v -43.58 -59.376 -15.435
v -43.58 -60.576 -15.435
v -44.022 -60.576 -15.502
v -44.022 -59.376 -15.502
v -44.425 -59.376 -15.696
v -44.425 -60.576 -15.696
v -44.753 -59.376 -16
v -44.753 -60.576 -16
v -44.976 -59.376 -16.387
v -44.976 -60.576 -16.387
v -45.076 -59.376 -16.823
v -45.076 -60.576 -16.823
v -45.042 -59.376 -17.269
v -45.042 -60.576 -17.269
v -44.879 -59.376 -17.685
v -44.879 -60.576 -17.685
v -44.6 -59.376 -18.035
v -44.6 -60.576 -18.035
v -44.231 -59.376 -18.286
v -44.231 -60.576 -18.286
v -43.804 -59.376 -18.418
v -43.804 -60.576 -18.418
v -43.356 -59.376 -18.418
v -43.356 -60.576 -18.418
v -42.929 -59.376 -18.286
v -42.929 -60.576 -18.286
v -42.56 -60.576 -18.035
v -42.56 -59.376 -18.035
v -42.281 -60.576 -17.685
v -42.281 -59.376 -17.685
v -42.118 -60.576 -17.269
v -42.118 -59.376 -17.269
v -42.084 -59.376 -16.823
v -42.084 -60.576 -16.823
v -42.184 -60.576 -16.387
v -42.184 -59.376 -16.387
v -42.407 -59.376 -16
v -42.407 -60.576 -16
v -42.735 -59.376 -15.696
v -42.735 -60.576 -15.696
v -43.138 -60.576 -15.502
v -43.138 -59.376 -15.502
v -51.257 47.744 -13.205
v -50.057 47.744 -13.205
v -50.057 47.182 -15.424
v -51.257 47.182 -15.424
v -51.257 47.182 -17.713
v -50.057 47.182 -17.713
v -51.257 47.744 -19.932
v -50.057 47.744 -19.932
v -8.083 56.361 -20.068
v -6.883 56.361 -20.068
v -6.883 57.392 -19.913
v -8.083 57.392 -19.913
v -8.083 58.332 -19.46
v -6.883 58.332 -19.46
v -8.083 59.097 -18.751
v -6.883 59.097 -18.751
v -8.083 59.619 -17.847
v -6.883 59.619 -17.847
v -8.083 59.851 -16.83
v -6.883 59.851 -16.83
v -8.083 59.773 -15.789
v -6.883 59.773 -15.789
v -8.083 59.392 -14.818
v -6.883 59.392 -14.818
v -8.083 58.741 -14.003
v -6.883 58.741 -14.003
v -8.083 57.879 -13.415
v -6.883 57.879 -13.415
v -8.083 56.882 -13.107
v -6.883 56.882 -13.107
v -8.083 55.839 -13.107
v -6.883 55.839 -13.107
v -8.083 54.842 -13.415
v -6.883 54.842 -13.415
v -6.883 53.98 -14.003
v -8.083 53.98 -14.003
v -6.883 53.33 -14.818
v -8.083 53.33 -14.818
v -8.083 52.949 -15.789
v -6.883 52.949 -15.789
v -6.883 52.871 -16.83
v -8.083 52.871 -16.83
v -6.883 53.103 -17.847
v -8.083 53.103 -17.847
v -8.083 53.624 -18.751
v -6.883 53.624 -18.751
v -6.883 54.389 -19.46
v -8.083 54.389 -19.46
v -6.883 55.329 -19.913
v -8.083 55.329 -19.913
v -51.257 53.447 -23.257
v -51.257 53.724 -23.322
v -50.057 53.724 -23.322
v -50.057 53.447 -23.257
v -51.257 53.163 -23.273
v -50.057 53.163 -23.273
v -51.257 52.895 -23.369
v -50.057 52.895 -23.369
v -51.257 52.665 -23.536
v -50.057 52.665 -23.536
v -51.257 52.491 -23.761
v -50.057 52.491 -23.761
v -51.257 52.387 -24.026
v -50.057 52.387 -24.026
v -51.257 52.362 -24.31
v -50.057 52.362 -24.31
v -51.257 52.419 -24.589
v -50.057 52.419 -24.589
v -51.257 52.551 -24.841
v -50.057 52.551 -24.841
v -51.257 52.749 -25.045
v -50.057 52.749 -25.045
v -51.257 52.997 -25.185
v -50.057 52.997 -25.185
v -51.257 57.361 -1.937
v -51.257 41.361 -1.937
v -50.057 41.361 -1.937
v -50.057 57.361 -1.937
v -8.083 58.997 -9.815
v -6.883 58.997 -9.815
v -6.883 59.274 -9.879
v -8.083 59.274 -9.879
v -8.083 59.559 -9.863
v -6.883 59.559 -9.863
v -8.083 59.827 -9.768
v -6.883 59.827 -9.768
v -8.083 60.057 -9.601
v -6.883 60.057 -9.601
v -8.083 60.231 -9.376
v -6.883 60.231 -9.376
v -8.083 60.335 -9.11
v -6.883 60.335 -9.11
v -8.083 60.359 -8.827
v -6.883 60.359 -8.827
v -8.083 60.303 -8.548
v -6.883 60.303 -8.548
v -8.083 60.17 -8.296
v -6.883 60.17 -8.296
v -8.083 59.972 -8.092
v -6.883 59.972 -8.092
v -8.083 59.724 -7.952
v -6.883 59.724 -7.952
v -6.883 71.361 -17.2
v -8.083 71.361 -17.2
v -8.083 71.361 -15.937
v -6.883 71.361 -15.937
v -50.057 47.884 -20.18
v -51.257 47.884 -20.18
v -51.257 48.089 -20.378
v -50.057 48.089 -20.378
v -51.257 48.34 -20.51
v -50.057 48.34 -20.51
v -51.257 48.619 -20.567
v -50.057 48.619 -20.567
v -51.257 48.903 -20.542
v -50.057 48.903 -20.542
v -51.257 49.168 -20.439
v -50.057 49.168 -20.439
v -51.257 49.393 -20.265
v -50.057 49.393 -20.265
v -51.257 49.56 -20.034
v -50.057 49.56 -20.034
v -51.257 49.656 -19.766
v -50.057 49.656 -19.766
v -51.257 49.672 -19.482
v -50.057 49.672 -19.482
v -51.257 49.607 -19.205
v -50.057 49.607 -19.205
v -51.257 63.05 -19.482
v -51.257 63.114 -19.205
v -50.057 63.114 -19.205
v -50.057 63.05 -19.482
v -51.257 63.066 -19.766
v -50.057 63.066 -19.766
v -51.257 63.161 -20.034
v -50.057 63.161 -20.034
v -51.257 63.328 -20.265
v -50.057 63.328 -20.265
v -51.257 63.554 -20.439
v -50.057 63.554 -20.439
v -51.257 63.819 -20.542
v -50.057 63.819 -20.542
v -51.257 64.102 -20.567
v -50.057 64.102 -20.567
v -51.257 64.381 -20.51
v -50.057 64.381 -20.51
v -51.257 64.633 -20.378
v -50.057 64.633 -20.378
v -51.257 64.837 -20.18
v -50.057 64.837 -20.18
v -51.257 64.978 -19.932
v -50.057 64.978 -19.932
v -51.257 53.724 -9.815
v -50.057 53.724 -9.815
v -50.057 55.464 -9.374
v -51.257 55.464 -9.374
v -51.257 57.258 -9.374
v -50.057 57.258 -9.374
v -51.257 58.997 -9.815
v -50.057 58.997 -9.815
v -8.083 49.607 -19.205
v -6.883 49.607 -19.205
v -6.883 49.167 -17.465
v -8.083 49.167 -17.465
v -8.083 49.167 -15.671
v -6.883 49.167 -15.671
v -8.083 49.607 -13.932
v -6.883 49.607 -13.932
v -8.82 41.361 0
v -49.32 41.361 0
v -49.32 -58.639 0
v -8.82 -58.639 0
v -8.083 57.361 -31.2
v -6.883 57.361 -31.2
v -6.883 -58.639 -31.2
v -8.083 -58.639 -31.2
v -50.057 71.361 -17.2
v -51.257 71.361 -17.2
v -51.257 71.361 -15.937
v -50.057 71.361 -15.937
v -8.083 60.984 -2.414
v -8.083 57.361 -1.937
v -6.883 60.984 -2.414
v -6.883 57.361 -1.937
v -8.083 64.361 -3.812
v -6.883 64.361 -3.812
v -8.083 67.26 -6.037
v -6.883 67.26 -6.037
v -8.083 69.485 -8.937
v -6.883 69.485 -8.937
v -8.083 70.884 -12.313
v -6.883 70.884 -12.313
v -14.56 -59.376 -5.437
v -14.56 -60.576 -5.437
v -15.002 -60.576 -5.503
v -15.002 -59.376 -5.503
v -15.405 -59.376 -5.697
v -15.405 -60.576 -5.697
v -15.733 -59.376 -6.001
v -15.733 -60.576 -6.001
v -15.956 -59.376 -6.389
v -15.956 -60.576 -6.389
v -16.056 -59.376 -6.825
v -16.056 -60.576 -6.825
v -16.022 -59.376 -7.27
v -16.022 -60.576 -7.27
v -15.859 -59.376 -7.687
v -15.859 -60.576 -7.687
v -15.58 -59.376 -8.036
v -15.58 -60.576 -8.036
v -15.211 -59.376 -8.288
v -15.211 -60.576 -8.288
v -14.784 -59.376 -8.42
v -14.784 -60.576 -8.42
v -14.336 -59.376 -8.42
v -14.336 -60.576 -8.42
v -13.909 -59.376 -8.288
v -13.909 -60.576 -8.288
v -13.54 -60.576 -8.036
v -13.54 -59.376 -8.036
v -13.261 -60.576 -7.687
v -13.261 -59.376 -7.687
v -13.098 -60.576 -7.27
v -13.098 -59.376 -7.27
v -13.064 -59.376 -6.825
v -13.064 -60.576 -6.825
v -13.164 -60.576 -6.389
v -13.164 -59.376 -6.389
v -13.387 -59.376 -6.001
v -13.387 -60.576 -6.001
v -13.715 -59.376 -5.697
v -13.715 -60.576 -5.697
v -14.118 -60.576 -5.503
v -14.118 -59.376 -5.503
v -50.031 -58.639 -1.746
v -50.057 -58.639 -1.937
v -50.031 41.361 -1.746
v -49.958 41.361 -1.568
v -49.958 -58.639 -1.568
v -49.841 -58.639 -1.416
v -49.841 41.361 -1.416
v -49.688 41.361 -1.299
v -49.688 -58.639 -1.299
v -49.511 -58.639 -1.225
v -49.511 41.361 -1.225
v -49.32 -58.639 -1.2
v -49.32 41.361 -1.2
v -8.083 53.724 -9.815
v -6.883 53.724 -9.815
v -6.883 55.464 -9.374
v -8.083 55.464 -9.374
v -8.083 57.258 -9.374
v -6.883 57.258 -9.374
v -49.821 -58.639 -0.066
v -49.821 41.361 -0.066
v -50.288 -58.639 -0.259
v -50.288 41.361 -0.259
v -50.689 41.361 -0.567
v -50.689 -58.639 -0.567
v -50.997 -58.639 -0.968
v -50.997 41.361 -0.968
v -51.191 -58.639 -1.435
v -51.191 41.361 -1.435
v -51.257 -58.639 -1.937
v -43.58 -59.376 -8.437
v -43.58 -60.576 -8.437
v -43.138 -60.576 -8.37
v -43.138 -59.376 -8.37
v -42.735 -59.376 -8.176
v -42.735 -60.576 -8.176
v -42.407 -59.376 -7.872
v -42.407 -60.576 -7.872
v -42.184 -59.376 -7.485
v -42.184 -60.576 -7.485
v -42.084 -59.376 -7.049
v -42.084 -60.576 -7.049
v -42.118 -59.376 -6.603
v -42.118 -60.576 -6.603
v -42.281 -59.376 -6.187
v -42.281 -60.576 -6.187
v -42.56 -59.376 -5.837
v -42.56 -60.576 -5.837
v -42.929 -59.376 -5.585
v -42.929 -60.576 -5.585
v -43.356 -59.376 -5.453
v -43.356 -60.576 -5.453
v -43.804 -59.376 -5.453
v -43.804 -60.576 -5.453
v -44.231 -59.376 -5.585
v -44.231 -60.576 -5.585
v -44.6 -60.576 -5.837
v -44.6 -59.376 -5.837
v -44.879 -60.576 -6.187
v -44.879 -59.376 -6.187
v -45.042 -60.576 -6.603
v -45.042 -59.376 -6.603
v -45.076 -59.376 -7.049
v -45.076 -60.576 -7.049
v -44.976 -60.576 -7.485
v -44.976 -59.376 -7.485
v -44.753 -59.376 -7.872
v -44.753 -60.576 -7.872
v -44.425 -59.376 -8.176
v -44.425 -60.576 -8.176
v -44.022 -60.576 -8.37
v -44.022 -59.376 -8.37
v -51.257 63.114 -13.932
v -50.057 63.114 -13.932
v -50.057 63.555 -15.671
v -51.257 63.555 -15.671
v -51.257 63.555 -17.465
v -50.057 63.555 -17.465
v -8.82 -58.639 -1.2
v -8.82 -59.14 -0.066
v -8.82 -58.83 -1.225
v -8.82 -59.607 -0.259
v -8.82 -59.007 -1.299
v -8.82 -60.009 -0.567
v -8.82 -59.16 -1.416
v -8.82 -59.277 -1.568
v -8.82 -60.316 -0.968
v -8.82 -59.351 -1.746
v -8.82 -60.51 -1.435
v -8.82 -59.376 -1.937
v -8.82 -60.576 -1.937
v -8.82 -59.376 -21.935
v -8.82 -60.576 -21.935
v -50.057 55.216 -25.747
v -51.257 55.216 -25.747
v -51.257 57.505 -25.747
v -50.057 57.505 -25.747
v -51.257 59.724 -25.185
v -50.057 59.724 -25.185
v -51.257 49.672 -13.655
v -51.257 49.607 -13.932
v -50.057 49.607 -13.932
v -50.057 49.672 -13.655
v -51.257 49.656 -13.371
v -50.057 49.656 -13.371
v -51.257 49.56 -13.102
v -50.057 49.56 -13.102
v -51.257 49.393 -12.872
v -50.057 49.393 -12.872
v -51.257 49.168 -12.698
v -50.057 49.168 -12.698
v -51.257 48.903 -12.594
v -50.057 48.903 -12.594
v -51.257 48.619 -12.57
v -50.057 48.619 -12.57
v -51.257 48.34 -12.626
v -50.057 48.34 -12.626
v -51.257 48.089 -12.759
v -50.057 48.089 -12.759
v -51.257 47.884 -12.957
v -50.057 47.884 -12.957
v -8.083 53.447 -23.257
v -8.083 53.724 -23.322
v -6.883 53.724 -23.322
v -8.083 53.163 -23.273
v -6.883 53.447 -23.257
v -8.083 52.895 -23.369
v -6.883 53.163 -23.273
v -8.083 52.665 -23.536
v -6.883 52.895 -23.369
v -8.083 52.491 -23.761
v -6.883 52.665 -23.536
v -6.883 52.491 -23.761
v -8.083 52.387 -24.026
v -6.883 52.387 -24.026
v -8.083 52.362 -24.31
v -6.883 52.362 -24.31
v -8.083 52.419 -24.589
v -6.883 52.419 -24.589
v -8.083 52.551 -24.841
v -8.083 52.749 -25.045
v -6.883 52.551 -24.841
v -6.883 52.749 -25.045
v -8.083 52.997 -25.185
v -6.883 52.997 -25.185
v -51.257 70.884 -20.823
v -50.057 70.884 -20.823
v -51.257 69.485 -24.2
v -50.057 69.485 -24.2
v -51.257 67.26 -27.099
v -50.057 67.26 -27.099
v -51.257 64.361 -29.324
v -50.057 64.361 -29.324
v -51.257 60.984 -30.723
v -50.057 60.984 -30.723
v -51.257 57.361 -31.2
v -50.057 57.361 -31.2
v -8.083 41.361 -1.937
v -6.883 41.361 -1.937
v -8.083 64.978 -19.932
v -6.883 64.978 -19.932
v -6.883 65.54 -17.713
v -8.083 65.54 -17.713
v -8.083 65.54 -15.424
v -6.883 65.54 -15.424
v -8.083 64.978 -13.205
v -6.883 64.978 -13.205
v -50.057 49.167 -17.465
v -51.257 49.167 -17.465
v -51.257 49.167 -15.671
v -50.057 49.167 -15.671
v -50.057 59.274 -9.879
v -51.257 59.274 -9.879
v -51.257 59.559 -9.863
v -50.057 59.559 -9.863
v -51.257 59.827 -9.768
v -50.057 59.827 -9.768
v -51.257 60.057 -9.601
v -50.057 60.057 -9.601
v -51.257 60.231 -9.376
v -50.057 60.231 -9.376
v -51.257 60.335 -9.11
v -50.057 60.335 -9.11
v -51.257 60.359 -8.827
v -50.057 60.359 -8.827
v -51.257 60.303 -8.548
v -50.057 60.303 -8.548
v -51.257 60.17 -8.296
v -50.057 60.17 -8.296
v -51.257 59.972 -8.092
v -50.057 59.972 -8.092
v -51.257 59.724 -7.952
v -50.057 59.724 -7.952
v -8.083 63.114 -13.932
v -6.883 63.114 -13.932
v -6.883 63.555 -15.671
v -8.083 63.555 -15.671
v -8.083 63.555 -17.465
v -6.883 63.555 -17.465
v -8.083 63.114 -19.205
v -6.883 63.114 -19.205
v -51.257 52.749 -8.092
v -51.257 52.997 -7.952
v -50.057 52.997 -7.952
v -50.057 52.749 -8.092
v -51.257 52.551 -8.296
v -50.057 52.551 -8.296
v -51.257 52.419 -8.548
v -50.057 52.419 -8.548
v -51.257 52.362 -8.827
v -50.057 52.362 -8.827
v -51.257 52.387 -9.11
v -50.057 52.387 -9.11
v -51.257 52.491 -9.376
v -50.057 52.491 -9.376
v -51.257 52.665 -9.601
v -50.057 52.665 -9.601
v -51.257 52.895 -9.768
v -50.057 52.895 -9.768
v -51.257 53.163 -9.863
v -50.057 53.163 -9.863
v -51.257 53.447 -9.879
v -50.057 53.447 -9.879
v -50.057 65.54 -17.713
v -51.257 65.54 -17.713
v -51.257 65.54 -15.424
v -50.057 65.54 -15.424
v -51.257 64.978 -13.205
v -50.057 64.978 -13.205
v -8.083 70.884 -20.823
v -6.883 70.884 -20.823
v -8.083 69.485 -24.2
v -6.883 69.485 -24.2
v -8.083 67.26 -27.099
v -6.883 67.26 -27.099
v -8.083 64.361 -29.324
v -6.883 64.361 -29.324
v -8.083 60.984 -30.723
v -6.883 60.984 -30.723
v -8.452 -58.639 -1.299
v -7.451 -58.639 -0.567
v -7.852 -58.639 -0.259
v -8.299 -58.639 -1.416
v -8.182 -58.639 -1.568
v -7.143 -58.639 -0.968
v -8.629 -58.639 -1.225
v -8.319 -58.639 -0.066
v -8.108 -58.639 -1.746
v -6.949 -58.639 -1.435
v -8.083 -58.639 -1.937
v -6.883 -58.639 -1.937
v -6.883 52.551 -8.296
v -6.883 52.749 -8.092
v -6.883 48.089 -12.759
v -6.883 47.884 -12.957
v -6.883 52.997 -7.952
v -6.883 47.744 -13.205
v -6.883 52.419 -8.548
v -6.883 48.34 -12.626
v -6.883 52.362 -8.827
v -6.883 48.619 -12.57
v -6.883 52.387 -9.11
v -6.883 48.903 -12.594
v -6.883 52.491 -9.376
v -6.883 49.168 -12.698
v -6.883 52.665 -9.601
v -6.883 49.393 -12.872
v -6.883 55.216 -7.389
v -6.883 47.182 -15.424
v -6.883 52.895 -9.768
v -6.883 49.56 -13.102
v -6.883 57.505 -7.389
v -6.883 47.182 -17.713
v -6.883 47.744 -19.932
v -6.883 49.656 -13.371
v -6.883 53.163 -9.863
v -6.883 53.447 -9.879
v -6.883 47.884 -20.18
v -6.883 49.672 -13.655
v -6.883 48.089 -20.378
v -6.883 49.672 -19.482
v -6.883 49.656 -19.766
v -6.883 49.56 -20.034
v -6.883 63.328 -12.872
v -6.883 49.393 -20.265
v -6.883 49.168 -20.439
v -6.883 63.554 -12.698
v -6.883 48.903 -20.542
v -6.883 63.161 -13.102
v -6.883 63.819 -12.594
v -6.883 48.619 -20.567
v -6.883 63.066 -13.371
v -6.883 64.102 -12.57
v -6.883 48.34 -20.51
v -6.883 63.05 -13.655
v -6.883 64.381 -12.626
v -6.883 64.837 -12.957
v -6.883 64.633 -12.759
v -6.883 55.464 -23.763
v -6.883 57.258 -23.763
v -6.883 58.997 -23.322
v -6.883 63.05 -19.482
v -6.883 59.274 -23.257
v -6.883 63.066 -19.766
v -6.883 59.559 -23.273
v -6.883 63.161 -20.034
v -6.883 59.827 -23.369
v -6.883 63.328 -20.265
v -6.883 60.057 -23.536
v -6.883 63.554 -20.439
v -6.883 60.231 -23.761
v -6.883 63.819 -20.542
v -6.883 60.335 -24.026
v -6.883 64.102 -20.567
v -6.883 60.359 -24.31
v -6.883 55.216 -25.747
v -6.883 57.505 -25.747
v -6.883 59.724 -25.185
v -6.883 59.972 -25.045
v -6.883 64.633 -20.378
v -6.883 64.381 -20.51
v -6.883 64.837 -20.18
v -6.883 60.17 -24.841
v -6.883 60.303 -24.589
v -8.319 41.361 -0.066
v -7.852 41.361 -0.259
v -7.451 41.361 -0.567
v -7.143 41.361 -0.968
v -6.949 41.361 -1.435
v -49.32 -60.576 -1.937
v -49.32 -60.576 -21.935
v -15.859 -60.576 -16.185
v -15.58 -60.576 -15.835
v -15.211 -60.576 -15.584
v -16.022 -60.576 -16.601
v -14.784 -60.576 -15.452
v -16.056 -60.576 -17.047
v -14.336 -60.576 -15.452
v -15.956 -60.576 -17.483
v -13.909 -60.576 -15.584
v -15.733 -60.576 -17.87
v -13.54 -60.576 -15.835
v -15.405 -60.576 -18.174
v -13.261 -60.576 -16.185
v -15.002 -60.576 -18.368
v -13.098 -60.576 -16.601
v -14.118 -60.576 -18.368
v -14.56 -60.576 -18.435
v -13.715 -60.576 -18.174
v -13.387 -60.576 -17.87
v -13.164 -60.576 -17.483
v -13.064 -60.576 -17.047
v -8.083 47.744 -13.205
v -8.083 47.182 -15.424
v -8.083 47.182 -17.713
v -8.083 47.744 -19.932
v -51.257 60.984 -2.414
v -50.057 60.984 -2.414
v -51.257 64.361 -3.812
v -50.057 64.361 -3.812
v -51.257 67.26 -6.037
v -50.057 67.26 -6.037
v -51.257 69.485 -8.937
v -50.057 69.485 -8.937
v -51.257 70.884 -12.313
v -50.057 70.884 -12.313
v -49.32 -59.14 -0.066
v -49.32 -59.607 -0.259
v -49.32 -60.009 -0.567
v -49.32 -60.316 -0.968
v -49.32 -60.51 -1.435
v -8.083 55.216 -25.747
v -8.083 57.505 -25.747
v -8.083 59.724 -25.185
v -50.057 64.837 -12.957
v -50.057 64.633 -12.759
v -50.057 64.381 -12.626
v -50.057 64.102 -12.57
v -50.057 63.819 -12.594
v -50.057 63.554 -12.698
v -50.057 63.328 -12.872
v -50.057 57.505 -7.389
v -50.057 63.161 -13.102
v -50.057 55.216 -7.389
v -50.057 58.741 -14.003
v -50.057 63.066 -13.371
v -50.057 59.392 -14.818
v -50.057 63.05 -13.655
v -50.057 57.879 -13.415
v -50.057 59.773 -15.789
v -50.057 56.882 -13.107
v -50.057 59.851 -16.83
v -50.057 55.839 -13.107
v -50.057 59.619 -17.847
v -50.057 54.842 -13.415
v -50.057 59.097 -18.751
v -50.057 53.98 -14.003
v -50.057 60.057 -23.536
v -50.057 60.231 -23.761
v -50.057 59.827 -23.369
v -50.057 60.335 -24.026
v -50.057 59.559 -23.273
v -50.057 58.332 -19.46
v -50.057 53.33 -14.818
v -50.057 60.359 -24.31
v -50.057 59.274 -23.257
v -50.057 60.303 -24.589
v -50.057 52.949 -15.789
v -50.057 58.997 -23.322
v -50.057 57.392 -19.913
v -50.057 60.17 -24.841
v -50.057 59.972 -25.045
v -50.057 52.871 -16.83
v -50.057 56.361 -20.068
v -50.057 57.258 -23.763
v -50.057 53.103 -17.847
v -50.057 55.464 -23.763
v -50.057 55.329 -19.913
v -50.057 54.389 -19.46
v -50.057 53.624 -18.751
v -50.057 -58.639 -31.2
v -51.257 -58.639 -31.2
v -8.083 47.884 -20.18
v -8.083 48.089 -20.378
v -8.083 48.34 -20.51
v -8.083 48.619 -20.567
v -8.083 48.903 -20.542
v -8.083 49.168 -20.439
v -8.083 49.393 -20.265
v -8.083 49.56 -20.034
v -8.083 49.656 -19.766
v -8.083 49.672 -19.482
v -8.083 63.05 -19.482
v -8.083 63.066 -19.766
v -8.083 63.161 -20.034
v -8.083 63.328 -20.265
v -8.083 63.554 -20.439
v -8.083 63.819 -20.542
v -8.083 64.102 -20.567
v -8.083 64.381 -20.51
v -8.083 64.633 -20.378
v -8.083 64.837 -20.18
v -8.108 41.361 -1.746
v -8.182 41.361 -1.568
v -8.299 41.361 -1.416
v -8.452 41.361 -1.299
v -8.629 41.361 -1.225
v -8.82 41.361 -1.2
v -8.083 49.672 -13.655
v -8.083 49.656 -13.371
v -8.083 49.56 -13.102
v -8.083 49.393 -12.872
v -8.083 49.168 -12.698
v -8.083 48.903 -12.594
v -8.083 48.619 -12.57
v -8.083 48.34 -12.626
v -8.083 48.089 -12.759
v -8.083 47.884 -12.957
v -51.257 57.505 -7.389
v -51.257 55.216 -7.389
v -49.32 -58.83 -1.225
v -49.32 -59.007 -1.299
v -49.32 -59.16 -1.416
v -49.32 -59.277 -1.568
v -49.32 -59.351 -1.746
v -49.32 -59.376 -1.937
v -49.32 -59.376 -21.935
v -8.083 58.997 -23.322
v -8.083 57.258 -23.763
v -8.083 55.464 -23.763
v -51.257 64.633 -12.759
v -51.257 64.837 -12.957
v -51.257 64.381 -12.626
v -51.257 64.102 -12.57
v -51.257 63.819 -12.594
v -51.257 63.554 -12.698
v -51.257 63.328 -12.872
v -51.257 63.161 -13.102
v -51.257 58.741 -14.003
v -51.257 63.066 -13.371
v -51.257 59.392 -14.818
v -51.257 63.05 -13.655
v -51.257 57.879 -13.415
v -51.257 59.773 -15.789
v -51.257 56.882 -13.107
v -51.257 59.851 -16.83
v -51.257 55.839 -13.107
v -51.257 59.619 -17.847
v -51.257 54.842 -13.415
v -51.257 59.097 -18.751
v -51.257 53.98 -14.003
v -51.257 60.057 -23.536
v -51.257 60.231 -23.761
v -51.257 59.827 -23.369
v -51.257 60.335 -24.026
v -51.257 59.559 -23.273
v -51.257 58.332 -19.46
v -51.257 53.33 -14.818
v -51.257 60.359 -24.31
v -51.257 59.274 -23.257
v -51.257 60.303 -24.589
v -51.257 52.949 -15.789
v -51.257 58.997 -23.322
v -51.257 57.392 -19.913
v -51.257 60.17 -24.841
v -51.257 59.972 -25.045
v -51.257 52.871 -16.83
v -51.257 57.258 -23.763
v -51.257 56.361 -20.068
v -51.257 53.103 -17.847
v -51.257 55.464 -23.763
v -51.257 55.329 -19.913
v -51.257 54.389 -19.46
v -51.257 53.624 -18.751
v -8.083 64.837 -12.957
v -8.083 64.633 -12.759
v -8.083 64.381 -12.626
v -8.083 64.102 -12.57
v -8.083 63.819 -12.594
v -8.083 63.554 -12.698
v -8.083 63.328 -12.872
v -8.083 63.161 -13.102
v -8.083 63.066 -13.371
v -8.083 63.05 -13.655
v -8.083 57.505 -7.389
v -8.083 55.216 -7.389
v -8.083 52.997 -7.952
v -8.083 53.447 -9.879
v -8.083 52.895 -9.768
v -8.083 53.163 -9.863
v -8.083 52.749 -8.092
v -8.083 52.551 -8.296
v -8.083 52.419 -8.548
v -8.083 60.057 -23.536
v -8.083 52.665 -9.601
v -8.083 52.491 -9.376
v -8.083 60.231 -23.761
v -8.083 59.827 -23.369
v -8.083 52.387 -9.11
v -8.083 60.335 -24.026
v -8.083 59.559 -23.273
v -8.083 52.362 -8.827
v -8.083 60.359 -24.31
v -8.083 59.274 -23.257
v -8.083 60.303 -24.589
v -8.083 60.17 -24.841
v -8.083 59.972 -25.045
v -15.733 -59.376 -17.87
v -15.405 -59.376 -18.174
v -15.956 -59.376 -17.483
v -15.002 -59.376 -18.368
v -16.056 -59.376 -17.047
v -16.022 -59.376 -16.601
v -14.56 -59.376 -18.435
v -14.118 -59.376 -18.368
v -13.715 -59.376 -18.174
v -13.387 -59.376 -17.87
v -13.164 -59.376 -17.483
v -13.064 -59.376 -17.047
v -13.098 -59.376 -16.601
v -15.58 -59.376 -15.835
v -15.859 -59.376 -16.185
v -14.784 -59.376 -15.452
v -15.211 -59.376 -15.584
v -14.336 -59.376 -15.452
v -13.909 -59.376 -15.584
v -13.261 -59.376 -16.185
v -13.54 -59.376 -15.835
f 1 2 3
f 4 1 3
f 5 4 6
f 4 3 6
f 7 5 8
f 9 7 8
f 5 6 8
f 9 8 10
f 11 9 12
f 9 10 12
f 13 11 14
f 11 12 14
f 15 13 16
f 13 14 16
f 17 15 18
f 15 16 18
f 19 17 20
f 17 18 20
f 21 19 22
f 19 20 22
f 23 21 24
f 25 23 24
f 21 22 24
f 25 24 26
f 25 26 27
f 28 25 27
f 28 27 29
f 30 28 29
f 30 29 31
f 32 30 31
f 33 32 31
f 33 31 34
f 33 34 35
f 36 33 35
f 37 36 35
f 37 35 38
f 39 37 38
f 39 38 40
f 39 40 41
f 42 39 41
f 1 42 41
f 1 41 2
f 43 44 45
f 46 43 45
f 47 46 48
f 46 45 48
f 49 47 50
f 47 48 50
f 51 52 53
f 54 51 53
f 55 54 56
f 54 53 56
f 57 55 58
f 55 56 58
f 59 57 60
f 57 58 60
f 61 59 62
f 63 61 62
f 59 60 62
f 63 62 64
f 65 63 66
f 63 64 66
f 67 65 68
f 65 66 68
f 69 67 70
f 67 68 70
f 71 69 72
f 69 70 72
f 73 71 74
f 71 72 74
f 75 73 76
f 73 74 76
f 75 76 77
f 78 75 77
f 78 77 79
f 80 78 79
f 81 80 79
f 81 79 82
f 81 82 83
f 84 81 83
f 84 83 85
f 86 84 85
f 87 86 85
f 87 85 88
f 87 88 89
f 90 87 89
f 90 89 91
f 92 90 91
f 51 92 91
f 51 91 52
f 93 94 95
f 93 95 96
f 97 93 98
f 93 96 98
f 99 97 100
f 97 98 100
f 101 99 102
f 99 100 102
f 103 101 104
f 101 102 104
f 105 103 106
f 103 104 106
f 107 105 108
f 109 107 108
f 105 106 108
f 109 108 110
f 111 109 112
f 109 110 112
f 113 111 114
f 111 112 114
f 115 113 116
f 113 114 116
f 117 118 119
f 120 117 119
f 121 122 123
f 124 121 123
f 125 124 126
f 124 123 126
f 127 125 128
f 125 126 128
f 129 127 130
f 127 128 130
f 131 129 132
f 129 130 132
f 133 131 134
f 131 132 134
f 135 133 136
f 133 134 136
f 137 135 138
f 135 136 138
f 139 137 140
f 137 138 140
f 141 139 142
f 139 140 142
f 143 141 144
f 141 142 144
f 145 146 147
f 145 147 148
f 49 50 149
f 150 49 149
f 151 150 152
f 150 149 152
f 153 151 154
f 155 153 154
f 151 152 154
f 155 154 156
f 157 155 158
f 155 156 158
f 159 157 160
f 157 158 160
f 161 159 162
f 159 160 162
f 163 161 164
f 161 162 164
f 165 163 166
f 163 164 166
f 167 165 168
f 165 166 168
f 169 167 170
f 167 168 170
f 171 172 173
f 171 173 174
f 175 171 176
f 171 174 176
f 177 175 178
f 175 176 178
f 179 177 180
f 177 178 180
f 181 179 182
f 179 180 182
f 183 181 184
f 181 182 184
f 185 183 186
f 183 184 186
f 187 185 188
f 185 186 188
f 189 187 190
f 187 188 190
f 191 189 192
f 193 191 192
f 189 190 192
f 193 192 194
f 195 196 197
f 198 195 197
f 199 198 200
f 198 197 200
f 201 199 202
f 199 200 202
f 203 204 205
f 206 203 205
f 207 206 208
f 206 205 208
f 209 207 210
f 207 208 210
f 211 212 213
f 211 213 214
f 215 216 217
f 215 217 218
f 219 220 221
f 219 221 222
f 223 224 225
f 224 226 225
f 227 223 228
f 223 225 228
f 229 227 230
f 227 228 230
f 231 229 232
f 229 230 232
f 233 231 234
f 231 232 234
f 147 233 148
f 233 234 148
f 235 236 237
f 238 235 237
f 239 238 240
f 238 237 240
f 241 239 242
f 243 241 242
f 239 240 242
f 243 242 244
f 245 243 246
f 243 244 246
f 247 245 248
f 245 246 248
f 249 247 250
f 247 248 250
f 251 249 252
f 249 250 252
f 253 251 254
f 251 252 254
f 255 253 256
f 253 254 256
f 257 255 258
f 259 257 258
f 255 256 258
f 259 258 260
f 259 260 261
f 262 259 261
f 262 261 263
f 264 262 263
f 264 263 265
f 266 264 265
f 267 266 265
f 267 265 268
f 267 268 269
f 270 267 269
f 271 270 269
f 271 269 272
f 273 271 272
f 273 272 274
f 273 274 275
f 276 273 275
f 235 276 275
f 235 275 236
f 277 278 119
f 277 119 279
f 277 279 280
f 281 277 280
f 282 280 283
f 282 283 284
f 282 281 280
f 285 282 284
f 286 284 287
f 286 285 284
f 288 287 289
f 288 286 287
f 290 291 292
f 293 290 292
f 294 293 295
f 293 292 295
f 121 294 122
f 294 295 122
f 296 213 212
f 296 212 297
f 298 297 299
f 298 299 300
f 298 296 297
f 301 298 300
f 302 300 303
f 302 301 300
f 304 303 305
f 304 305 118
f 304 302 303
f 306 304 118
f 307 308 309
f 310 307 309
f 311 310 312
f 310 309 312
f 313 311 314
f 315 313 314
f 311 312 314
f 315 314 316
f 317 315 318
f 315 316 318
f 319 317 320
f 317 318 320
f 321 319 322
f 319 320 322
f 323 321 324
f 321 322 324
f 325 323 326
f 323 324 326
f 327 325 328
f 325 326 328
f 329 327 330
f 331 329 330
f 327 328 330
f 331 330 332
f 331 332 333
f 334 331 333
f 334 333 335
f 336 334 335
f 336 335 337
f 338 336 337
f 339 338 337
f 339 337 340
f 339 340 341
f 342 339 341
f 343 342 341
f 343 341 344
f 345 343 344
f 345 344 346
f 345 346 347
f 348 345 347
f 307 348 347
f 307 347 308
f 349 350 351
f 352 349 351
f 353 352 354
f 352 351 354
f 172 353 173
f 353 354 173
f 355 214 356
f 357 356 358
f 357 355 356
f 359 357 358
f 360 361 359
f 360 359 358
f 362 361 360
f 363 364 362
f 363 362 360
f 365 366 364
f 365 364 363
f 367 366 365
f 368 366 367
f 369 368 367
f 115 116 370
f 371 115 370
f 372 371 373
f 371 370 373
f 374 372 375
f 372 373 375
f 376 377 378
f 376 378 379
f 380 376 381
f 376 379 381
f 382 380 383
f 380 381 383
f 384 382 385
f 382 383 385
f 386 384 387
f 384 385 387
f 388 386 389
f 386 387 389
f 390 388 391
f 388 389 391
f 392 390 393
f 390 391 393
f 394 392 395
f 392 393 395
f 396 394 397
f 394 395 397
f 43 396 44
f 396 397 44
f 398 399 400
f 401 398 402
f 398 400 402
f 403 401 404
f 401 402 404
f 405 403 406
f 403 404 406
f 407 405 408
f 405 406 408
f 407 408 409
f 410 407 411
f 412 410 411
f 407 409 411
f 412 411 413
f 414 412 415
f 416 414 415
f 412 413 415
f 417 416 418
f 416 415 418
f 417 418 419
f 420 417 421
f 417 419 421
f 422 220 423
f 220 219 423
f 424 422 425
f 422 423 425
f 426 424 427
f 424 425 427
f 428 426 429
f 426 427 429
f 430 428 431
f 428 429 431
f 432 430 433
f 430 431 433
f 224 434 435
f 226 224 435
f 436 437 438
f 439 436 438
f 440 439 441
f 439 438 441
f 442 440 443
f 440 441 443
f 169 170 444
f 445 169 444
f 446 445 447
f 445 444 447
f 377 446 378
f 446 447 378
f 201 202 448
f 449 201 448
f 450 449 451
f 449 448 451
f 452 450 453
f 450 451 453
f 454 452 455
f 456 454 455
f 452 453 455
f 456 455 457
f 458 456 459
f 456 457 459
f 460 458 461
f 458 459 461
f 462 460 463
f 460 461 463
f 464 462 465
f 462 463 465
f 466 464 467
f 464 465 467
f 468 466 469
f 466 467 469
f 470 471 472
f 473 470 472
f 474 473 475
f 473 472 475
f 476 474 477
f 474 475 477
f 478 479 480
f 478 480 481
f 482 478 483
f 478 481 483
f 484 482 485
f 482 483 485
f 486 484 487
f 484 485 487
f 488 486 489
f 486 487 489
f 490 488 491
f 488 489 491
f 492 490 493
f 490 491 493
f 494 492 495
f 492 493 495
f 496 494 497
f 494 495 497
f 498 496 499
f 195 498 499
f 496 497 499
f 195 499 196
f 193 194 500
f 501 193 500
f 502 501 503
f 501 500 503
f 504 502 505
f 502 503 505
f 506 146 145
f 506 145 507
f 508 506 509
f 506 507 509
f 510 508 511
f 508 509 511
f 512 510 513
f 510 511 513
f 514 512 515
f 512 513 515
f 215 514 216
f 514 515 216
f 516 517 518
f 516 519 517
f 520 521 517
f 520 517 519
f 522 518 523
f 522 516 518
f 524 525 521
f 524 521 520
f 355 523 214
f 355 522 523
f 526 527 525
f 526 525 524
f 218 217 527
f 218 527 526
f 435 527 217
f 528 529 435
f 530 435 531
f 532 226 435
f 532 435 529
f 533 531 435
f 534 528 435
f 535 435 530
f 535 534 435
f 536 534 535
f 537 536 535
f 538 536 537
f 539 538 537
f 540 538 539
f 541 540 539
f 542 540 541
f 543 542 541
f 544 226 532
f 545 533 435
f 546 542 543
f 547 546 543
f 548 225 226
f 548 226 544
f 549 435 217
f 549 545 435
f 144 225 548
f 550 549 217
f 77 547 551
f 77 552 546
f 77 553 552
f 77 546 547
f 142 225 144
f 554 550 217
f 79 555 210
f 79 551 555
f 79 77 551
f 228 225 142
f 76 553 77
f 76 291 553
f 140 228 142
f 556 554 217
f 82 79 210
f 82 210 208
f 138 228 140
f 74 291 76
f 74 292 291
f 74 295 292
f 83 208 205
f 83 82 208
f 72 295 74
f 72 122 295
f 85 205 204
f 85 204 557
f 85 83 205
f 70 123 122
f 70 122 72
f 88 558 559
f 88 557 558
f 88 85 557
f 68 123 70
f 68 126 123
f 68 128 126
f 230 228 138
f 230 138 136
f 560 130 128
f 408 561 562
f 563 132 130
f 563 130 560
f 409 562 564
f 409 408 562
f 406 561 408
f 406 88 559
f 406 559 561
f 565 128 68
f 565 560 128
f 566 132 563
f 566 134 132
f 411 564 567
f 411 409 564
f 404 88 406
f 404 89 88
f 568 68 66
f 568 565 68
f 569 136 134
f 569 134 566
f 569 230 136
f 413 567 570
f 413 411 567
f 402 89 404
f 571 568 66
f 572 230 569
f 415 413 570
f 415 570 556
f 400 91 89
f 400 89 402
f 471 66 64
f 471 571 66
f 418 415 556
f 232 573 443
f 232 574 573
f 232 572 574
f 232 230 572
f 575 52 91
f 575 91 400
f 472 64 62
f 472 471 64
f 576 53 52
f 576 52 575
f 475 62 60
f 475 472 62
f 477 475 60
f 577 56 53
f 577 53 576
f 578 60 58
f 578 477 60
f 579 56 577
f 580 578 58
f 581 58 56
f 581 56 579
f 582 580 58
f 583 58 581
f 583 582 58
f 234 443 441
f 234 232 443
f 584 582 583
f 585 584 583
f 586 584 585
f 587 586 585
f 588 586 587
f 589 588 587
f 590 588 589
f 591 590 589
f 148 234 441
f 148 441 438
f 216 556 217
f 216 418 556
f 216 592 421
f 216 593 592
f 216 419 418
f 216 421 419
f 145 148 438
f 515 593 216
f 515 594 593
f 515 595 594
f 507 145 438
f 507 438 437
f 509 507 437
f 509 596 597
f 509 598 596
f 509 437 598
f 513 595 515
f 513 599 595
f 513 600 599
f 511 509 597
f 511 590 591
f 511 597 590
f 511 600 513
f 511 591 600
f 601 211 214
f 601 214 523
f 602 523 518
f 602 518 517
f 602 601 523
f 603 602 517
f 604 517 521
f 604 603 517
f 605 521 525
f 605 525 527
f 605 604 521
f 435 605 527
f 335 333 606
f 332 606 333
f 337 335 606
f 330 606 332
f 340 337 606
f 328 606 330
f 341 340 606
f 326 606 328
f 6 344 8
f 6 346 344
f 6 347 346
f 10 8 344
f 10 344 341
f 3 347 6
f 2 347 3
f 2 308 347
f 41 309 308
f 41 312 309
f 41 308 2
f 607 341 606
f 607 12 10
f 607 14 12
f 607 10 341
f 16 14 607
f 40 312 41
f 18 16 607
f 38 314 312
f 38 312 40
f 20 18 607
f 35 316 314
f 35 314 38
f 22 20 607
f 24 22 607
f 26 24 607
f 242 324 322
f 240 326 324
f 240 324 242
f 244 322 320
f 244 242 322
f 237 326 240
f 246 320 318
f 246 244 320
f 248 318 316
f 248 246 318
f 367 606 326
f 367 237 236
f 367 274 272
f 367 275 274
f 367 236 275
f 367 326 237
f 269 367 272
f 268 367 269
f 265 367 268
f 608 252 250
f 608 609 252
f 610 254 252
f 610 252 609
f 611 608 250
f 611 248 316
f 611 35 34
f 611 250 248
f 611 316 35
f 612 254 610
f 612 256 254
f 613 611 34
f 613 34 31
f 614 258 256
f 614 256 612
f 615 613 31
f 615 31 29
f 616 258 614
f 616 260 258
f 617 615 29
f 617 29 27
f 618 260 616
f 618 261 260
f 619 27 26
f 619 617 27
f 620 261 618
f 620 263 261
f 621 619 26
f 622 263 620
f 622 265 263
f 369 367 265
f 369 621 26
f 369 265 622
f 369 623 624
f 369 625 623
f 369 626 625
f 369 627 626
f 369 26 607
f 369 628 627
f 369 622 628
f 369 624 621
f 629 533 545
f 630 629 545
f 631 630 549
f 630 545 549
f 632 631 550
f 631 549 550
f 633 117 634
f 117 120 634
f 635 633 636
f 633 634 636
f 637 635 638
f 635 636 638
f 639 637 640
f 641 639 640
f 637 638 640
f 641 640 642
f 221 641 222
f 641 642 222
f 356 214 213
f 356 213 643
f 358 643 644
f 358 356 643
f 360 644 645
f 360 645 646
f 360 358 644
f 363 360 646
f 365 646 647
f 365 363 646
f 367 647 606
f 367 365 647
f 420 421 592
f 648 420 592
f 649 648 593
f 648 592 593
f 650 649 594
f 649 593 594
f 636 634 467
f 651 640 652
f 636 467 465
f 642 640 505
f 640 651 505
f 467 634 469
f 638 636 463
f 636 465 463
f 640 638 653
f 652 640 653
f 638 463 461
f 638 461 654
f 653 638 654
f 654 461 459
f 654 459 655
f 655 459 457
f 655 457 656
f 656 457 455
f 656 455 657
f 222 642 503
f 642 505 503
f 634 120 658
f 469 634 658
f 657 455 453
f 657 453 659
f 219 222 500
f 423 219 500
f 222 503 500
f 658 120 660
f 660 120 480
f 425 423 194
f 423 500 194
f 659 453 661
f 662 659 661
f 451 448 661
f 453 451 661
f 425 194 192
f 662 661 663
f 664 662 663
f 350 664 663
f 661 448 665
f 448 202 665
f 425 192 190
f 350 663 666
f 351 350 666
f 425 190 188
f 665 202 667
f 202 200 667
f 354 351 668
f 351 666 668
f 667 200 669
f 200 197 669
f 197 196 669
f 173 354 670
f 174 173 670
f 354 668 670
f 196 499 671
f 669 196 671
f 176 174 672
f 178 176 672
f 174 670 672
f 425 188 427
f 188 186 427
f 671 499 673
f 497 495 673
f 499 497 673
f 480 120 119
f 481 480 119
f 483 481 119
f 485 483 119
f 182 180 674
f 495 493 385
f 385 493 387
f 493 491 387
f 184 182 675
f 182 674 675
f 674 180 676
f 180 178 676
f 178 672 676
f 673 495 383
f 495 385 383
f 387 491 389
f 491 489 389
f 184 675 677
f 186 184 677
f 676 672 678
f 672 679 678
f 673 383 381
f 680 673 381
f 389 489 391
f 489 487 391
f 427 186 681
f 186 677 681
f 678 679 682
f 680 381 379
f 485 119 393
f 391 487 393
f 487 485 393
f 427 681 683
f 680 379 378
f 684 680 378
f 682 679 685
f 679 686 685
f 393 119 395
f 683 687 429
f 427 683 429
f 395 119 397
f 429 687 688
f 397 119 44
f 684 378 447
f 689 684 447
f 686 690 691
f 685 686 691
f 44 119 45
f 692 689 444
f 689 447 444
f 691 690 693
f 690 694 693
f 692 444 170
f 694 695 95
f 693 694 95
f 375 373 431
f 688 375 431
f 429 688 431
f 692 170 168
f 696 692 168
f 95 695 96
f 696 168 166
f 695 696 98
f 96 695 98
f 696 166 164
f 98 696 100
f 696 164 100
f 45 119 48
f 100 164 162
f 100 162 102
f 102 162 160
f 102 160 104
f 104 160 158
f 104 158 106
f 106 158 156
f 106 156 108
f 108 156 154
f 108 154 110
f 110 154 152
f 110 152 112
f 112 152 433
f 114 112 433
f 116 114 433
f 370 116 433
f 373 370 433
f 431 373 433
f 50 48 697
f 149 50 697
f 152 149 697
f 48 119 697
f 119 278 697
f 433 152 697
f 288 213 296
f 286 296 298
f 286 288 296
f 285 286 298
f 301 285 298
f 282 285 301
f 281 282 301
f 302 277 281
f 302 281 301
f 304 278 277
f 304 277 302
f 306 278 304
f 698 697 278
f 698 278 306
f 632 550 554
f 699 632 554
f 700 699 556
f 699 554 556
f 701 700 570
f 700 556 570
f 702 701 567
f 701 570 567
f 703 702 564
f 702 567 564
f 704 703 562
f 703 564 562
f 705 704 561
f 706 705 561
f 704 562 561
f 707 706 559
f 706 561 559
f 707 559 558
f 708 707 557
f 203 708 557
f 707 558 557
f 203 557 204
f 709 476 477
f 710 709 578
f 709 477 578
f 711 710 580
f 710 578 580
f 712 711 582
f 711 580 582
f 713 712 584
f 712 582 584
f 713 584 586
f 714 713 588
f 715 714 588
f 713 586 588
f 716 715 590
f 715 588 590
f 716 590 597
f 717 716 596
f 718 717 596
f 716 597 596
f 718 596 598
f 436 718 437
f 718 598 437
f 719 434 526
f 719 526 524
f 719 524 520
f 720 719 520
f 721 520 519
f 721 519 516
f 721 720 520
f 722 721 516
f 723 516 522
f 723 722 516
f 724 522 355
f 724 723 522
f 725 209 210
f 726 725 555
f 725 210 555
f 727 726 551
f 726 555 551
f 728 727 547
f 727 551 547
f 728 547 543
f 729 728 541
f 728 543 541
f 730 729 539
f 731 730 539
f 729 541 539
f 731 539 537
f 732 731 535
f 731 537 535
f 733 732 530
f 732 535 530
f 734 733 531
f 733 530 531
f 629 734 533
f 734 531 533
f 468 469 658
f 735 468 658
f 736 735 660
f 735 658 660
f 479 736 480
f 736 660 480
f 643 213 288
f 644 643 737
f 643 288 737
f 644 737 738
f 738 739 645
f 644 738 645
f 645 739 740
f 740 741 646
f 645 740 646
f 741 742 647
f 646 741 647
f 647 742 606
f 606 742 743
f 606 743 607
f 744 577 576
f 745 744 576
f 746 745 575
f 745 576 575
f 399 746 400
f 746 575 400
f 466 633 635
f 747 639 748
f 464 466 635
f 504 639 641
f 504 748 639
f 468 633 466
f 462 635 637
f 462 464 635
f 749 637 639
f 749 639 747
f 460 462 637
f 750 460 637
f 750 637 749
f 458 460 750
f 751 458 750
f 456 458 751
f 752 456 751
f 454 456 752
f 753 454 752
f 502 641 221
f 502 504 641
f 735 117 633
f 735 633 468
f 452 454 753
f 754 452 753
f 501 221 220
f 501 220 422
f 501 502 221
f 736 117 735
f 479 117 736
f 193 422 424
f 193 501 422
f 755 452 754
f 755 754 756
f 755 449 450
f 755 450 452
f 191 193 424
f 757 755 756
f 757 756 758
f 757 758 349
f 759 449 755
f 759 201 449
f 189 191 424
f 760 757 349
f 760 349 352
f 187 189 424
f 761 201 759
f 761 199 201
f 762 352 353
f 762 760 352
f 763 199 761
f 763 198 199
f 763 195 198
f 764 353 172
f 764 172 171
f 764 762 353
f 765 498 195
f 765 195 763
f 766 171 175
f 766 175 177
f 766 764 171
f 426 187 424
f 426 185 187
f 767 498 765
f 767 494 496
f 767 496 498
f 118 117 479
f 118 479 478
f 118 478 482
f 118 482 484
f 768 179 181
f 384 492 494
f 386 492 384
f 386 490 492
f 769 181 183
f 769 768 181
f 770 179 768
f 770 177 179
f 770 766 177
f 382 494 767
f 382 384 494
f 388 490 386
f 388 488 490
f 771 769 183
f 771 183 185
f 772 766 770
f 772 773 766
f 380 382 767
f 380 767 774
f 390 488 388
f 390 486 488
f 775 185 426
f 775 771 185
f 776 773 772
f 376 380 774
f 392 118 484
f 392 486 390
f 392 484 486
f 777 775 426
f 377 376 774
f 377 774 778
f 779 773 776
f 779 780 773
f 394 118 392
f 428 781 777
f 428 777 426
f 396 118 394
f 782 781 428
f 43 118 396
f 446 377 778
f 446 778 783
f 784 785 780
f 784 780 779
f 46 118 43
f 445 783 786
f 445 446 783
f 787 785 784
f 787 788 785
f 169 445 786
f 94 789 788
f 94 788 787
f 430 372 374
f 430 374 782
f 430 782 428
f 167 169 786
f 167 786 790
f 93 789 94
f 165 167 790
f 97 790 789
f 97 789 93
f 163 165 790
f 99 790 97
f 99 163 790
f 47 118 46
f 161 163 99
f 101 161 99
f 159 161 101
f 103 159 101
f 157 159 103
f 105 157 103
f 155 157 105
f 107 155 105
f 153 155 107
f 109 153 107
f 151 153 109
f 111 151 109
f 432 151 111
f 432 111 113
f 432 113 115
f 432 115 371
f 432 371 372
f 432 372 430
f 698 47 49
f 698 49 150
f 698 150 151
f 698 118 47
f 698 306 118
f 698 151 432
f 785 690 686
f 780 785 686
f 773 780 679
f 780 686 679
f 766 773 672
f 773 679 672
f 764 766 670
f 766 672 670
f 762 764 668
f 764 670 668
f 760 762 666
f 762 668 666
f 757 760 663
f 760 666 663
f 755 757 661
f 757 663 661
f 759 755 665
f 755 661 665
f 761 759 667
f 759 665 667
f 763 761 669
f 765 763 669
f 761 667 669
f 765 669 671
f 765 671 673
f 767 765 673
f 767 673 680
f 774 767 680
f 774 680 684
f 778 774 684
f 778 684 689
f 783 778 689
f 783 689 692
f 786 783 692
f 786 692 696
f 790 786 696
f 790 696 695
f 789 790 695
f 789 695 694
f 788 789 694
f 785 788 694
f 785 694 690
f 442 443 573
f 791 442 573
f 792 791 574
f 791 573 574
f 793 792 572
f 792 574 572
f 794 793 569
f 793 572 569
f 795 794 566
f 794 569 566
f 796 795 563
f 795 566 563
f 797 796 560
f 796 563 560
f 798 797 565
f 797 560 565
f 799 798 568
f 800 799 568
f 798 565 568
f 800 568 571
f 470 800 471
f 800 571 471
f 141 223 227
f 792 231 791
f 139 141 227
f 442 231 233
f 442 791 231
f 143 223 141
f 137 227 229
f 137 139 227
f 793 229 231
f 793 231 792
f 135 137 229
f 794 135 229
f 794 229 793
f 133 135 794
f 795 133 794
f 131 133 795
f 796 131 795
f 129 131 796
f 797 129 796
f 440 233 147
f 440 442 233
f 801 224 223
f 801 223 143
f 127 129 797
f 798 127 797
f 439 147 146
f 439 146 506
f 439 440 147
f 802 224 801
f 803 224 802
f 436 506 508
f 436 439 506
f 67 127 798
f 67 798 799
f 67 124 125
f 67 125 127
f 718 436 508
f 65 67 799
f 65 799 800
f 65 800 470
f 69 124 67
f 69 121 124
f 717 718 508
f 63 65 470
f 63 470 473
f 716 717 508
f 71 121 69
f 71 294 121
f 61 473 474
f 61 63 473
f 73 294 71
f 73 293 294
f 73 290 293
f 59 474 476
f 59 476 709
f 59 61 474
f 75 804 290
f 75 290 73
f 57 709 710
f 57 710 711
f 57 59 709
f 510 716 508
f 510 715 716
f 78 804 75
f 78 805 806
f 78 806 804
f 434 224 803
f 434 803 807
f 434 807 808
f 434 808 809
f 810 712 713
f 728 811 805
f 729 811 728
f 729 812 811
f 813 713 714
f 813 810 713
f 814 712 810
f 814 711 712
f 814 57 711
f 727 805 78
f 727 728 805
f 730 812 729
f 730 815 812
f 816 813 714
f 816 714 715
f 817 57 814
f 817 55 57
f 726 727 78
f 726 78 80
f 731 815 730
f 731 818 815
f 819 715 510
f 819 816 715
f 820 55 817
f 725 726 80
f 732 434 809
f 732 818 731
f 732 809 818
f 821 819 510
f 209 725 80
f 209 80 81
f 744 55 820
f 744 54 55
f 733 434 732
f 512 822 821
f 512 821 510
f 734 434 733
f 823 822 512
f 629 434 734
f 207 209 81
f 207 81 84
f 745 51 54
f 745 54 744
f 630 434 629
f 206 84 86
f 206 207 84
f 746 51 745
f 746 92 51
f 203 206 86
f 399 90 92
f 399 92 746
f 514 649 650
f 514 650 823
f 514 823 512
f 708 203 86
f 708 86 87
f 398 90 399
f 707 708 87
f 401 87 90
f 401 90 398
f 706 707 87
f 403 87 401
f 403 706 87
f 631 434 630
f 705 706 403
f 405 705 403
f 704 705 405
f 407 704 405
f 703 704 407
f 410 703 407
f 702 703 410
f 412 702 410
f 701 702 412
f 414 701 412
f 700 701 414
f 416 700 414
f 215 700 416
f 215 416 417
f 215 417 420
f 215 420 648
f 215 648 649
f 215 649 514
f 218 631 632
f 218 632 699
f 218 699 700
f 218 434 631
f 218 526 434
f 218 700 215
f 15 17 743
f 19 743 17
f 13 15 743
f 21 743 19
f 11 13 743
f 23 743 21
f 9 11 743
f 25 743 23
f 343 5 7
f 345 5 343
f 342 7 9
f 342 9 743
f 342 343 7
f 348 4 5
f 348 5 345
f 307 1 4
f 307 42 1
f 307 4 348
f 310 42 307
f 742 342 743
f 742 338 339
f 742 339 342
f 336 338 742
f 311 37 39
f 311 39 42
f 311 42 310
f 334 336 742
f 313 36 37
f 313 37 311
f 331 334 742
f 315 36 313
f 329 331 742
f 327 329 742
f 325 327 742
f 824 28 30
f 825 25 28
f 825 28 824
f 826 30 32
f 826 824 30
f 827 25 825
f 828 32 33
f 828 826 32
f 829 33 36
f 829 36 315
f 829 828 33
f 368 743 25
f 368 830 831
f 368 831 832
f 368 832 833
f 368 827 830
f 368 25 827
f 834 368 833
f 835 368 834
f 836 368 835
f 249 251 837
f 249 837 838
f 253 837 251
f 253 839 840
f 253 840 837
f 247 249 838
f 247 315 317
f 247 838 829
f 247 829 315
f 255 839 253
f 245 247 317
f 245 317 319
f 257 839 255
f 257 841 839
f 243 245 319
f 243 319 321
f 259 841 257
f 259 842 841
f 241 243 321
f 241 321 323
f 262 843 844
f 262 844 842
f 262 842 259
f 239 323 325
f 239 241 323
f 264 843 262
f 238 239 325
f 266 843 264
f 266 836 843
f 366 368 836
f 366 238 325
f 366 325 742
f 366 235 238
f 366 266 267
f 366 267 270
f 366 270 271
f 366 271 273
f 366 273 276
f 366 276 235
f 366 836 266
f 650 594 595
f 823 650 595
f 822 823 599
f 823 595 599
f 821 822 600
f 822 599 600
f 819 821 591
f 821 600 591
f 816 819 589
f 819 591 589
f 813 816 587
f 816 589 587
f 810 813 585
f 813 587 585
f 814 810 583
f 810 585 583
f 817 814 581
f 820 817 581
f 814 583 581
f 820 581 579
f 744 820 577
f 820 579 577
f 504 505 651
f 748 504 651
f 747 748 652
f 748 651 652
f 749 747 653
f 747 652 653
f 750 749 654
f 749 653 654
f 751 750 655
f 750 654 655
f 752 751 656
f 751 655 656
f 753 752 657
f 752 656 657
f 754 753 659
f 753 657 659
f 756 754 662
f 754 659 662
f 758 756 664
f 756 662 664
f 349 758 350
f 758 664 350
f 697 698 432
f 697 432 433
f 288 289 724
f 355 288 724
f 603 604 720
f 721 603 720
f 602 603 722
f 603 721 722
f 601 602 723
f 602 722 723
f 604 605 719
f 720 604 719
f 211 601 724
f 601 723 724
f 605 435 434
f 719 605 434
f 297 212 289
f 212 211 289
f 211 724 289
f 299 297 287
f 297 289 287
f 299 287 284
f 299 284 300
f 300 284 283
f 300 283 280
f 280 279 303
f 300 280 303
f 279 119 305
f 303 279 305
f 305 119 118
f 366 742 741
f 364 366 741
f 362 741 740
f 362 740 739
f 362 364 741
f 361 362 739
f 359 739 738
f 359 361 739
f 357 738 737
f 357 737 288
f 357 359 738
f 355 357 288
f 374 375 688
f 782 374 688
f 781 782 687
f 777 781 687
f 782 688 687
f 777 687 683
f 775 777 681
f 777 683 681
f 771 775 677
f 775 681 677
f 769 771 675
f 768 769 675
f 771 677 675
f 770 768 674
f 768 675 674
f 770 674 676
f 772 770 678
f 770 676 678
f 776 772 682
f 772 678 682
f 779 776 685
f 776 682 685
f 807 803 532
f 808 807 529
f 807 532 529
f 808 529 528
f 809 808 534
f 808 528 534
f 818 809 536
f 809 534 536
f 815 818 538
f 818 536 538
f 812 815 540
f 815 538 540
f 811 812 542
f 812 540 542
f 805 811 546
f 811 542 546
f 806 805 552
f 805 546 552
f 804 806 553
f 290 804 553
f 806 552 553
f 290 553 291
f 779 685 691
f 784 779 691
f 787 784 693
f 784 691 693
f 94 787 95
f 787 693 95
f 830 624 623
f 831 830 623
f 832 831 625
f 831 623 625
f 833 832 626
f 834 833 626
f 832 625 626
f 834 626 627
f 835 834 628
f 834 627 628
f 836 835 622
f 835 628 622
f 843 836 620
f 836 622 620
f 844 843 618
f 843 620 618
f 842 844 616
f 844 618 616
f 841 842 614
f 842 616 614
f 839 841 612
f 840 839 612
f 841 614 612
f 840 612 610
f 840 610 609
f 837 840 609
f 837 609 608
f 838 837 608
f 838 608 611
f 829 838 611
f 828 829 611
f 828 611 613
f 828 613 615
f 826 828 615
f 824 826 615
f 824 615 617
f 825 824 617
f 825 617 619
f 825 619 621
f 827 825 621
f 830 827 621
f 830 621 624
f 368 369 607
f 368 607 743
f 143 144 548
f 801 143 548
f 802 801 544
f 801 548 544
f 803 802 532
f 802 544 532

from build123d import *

# Parameters (mm, degrees)
SKETCH_1_W                  = 40.5
SKETCH_1_H                  = 100
SM_BASE_FLANGE_1_DEPTH      = 1.2
SM_EDGE_FLANGE_1_DEPTH      = 100
SM_EDGE_FLANGE_1_BEND_DEPTH = 100
SM_EDGE_FLANGE_3_DEPTH      = 40.5
SKETCH_25_R                 = 1.5
CUT_EXTRUDE_1_DEPTH         = 10
SKETCH_26_W                 = 1.2
SKETCH_26_H                 = 29.2634
EXTRUDE_1_DEPTH             = 30
SKETCH_29_R                 = 3.5
CUT_EXTRUDE_2_DEPTH         = 87
FILLET_1_R                  = 14


# Sheet-metal steps are written as plain solids
with BuildPart() as part:
    # Sketch 1 → 基材-凸緣1 (new body)
    with BuildSketch(Plane.XY):
        with Locations((-29.069965263, -8.639189189)):
            Rectangle(SKETCH_1_W, SKETCH_1_H)
    extrude(amount=-SM_BASE_FLANGE_1_DEPTH)

    # 邊線-凸緣1 section (across the edge) → 邊線-凸緣1 (add)
    with BuildSketch(Plane(origin=(-8.083365263, 41.360810811, -1.2), x_dir=(-1, 0, 0), z_dir=(0, -1, 0))):
        with BuildLine():
            Line((-1.2, 0.7366), (-1.2, 30))
            Line((-1.2, 30), (0, 30))
            Line((0, 30), (0, 0.7366))
            ThreePointArc((0, 0.7366), (0.215745145, 0.215745145), (0.7366, 0))
            Line((0.7366, 0), (0.7366, -1.2))
            ThreePointArc((0.7366, -1.2), (-0.632782992, -0.632782992), (-1.2, 0.7366))
        make_face()
    extrude(amount=SM_EDGE_FLANGE_1_DEPTH)

    # 邊線-凸緣1 section 2 (across the edge) → 邊線-凸緣1 bend (add)
    with BuildSketch(Plane(origin=(-50.056565263, -58.639189189, -1.2), x_dir=(1, 0, 0), z_dir=(0, 1, 0))):
        with BuildLine():
            Line((-1.2, 0.7366), (-1.2, 30))
            Line((-1.2, 30), (0, 30))
            Line((0, 30), (0, 0.7366))
            ThreePointArc((0, 0.7366), (0.215745145, 0.215745145), (0.7366, 0))
            Line((0.7366, 0), (0.7366, -1.2))
            ThreePointArc((0.7366, -1.2), (-0.632782992, -0.632782992), (-1.2, 0.7366))
        make_face()
    extrude(amount=SM_EDGE_FLANGE_1_BEND_DEPTH)

    # 邊線-凸緣3 section (across the edge) → 邊線-凸緣3 (add)
    with BuildSketch(Plane(origin=(-8.819965263, -59.375789189, -1.2), x_dir=(0, 1, 0), z_dir=(-1, 0, 0))):
        with BuildLine():
            Line((-1.2, 0.7366), (-1.2, 20.735))
            Line((-1.2, 20.735), (0, 20.735))
            Line((0, 20.735), (0, 0.7366))
            ThreePointArc((0, 0.7366), (0.215745145, 0.215745145), (0.7366, 0))
            Line((0.7366, 0), (0.7366, -1.2))
            ThreePointArc((0.7366, -1.2), (-0.632782992, -0.632782992), (-1.2, 0.7366))
        make_face()
    extrude(amount=SM_EDGE_FLANGE_3_DEPTH)

    # 草圖25 → 除料-伸長1 (cut)
    with BuildSketch(Plane.XZ.offset(60.575789189)):
        with Locations(Location((-43.579965263, -6.9366, 0), (0, 0, 270))):
            Circle(SKETCH_25_R)
        with Locations(Location((-43.579965263, -16.935, 0), (0, 0, 90))):
            Circle(SKETCH_25_R)
        with Locations(Location((-14.559965263, -16.935, 0), (0, 0, 270))):
            Circle(SKETCH_25_R)
        with Locations(Location((-14.559965263, -6.9366, 0), (0, 0, 90))):
            Circle(SKETCH_25_R)
    extrude(amount=-CUT_EXTRUDE_1_DEPTH, mode=Mode.SUBTRACT)

    # 草圖26 → 填料-伸長1 (add)
    with BuildSketch(Plane(origin=(0, 41.360810811, 0), x_dir=(1, 0, 0), z_dir=(0, 1, 0))):
        with Locations((-50.656565263, 16.5683)):
            Rectangle(SKETCH_26_W, SKETCH_26_H)
        with Locations((-7.483365263, 16.5683)):
            Rectangle(SKETCH_26_W, SKETCH_26_H)
    extrude(amount=EXTRUDE_1_DEPTH)

    # 草圖29 → 除料-伸長2 (cut)
    with BuildSketch(Plane(origin=(-6.883365263, 0, 0), x_dir=(0, 0, -1), z_dir=(1, 0, 0))):
        with Locations((16.5683, 56.360810811)):
            Circle(SKETCH_29_R)
        with BuildLine():
            ThreePointArc((25.185054053, 52.997174447), (25.8183, 56.360810811), (25.185054053, 59.724447174))
            ThreePointArc((25.185054053, 59.724447174), (23.889876711, 60.29235179), (23.321972096, 58.997174447))
            ThreePointArc((23.321972096, 58.997174447), (23.8183, 56.360810811), (23.321972096, 53.724447174))
            ThreePointArc((23.321972096, 53.724447174), (23.889876711, 52.429269832), (25.185054053, 52.997174447))
        make_face()
        with BuildLine():
            ThreePointArc((13.204663636, 64.977564864), (12.636759021, 63.682387522), (13.931936364, 63.114482907))
            ThreePointArc((13.931936364, 63.114482907), (16.5683, 63.610810811), (19.204663636, 63.114482907))
            ThreePointArc((19.204663636, 63.114482907), (20.499840979, 63.682387522), (19.931936364, 64.977564864))
            ThreePointArc((19.931936364, 64.977564864), (16.5683, 65.610810811), (13.204663636, 64.977564864))
        make_face()
        with BuildLine():
            ThreePointArc((13.204663636, 47.744056758), (16.5683, 47.110810811), (19.931936364, 47.744056758))
            ThreePointArc((19.931936364, 47.744056758), (20.499840979, 49.0392341), (19.204663636, 49.607138715))
            ThreePointArc((19.204663636, 49.607138715), (16.5683, 49.110810811), (13.931936364, 49.607138715))
            ThreePointArc((13.931936364, 49.607138715), (12.636759021, 49.0392341), (13.204663636, 47.744056758))
        make_face()
        with BuildLine():
            ThreePointArc((7.951545947, 59.724447174), (7.3183, 56.360810811), (7.951545947, 52.997174447))
            ThreePointArc((7.951545947, 52.997174447), (9.246723289, 52.429269832), (9.814627904, 53.724447174))
            ThreePointArc((9.814627904, 53.724447174), (9.3183, 56.360810811), (9.814627904, 58.997174447))
            ThreePointArc((9.814627904, 58.997174447), (9.246723289, 60.29235179), (7.951545947, 59.724447174))
        make_face()
    extrude(amount=-CUT_EXTRUDE_2_DEPTH, mode=Mode.SUBTRACT)

    # 圓角1
    fillet_1_edges = [part.edges().sort_by_distance(p)[0] for p in [
        (-50.656565263, 71.360810811, -31.2),
        (-50.656565263, 71.360810811, -1.9366),
        (-7.483365263, 71.360810811, -31.2),
        (-7.483365263, 71.360810811, -1.9366),
    ]]
    fillet(fillet_1_edges, radius=FILLET_1_R)


solid = part.part
